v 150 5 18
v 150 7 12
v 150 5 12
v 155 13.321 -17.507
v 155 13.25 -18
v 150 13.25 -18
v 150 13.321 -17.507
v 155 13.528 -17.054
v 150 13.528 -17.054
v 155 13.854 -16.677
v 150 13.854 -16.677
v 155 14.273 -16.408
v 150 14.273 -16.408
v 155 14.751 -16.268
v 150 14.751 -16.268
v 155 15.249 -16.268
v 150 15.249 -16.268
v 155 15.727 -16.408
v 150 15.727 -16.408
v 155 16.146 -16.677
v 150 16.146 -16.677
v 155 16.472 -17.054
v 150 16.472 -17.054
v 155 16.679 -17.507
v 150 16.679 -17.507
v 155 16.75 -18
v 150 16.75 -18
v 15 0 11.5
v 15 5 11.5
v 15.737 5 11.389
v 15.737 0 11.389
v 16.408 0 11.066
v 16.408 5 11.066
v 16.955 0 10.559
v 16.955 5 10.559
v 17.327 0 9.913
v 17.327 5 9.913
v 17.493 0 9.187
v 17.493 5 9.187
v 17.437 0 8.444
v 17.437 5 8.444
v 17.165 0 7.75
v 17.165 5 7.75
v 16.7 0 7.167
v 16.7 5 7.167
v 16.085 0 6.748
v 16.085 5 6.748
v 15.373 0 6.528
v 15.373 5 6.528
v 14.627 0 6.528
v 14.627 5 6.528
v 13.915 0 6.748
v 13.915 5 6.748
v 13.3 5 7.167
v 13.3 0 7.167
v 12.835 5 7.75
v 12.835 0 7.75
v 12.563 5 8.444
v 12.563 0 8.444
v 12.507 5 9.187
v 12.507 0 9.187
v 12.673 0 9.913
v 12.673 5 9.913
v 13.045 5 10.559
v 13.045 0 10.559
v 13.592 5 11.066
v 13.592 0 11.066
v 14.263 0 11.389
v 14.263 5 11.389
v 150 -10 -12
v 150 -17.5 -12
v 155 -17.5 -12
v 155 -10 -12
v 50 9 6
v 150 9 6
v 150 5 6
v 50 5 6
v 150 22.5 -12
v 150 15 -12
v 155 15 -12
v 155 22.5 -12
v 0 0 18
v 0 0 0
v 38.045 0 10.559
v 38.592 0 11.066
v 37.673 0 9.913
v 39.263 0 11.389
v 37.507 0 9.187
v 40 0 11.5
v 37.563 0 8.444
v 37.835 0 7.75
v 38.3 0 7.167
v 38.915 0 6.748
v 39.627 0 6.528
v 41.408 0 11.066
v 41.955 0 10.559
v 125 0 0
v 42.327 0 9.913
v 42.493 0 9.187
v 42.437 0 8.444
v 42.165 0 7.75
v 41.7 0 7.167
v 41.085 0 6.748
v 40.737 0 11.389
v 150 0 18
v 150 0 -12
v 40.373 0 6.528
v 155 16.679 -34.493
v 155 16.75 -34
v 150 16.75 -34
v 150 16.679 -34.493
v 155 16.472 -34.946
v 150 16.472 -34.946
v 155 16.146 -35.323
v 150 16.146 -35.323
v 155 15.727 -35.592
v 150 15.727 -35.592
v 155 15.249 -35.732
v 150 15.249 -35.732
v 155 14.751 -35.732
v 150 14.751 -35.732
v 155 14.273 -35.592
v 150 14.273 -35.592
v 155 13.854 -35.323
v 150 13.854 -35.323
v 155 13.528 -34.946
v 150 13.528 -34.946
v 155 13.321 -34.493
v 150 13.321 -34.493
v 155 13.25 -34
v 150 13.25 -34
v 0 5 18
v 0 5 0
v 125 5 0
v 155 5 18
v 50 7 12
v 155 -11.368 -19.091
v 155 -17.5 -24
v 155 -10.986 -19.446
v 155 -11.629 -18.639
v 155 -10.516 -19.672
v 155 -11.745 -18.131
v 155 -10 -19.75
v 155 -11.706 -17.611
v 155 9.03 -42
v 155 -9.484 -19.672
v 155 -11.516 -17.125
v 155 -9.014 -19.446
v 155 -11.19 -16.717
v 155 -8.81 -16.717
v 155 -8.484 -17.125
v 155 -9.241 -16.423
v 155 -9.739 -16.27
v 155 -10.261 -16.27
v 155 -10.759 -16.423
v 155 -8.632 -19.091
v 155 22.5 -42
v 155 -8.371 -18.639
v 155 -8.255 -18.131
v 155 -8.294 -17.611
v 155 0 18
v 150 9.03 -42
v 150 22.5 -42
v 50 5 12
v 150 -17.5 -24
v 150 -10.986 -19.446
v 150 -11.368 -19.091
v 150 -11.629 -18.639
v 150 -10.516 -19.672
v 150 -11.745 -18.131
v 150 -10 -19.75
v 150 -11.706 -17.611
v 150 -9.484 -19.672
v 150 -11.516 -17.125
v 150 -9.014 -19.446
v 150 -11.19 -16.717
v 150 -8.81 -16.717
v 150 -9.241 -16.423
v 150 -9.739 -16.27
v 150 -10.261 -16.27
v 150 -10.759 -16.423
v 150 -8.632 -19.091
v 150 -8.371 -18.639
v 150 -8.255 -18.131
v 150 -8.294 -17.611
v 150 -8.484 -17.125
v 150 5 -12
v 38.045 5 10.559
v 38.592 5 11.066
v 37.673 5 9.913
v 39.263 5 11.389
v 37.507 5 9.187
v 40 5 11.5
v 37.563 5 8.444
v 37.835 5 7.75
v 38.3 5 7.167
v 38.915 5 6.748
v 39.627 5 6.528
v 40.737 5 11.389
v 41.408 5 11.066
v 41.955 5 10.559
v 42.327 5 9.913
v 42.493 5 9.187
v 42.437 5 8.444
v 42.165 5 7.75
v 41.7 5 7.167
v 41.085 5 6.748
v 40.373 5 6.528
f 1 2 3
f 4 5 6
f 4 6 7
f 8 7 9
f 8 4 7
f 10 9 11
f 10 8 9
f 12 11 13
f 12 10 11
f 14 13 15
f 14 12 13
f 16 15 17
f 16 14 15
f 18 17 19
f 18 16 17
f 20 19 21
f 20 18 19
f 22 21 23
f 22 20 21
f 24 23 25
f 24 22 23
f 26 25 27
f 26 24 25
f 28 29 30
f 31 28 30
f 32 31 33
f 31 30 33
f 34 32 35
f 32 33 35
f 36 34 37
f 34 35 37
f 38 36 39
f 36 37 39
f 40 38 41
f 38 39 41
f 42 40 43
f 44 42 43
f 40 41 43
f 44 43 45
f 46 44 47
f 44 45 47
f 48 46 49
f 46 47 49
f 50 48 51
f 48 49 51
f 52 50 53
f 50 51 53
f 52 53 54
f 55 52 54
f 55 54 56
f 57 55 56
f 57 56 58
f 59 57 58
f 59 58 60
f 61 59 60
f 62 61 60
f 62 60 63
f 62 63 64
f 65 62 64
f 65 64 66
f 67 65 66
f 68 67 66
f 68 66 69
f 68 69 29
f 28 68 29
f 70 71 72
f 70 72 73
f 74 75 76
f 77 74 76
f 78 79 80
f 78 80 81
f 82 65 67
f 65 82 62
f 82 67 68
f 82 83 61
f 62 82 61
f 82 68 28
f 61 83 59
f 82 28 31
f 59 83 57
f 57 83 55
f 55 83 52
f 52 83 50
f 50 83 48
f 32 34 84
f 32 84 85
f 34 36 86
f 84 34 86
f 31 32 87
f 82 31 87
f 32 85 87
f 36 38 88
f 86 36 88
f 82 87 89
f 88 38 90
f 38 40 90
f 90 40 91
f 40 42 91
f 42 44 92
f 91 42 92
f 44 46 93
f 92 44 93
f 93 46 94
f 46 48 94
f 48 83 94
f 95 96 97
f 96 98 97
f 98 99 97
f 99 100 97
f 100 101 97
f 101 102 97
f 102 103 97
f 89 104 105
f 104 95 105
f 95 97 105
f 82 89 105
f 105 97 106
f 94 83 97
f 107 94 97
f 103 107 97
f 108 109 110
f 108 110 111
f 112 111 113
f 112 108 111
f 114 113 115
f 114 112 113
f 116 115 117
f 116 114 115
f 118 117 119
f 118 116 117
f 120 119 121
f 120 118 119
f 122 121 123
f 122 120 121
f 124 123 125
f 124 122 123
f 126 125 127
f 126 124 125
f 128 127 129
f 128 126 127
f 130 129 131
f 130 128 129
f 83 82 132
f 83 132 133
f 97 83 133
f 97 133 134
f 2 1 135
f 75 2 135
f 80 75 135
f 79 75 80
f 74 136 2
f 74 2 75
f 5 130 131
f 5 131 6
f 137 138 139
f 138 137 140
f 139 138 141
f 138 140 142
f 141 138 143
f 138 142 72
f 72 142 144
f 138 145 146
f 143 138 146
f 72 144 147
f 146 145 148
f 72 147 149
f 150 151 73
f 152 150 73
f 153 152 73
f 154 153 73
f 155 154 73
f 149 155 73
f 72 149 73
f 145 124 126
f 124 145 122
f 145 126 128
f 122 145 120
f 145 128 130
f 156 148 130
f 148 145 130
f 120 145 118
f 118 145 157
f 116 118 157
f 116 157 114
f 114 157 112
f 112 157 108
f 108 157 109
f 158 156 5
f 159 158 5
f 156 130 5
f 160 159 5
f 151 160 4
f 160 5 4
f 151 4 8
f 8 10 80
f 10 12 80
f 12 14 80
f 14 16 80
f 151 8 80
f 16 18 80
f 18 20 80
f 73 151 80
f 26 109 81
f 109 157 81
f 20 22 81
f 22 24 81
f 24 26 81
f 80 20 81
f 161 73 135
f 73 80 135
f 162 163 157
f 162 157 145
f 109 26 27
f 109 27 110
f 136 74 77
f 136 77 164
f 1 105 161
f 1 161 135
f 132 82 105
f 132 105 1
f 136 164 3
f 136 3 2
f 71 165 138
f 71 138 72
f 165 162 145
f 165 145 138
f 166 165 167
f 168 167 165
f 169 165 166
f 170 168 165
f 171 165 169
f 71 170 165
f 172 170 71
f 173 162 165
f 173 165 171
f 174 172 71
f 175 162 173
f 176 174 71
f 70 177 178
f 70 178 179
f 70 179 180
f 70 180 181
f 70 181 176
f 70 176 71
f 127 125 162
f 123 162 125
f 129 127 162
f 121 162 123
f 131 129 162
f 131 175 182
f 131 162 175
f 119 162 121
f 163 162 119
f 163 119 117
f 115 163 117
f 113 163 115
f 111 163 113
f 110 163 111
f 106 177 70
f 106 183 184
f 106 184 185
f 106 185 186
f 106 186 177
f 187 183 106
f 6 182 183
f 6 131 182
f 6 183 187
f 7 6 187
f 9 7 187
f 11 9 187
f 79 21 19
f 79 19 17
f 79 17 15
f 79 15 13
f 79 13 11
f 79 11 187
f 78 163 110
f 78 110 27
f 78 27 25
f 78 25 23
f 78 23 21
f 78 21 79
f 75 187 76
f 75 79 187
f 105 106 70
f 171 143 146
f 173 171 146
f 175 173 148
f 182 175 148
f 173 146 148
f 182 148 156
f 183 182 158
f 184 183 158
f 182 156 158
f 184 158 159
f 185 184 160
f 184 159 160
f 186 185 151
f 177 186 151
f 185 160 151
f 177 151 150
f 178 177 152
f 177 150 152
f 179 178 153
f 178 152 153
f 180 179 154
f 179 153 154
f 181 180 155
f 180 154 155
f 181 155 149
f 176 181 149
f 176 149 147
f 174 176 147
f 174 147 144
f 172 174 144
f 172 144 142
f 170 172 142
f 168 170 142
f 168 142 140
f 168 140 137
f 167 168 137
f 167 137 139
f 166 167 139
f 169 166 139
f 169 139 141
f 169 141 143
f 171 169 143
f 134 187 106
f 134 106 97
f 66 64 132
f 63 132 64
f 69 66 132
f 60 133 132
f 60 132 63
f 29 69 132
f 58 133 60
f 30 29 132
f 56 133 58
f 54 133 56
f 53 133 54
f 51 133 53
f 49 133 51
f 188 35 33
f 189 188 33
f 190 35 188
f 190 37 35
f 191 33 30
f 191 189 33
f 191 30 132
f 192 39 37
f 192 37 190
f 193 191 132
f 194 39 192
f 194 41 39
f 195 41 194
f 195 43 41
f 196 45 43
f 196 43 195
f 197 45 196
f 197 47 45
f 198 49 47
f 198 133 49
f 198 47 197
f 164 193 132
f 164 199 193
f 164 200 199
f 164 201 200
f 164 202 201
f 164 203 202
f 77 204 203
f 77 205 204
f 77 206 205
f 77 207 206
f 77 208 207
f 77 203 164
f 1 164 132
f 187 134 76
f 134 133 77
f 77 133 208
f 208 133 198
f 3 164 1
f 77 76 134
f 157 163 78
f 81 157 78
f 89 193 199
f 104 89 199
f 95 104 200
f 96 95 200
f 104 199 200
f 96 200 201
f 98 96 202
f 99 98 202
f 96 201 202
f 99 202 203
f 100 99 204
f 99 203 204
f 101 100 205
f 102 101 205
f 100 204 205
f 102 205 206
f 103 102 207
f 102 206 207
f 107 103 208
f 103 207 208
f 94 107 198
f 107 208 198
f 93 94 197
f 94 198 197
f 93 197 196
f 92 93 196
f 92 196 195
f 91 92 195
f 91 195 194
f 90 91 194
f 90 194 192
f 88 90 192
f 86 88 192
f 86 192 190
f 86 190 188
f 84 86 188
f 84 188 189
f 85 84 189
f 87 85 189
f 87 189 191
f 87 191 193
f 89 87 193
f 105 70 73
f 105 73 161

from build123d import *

# Parameters (mm, degrees)
SKETCH_1_W          = 150
SKETCH_1_H          = 18
EXTRUDE_1_DEPTH     = 5
SKETCH_2_R          = 2.5
CUT_EXTRUDE_1_DEPTH = 152.158856836
EXTRUDE_3_DEPTH     = 5
CUT_EXTRUDE_2_REACH = 164.158
SKETCH_8_R          = 1.75
EXTRUDE_4_DEPTH     = 100
EXTRUDE_5_DEPTH     = 5


with BuildPart() as part:
    # 草图1 → 凸台-拉伸1 (new body)
    with BuildSketch(Plane(origin=(0, 0, 0), x_dir=(1, 0, 0), z_dir=(0, 1, 0))):
        with Locations((75, -9)):
            Rectangle(SKETCH_1_W, SKETCH_1_H)
    extrude(amount=EXTRUDE_1_DEPTH)

    # 草图2 → 切除-拉伸1 (cut, through all)
    with BuildSketch(Plane(origin=(0, 5, 0), x_dir=(1, 0, 0), z_dir=(0, 1, 0))):
        with Locations(Location((15, -9, 0), (0, 0, 270))):
            Circle(SKETCH_2_R)
        with Locations(Location((40, -9, 0), (0, 0, 270))):
            Circle(SKETCH_2_R)
    extrude(amount=-CUT_EXTRUDE_1_DEPTH, mode=Mode.SUBTRACT)

    # 草图6 → 凸台-拉伸3 (add)
    with BuildSketch(Plane(origin=(150, 0, 0), x_dir=(0, 0, -1), z_dir=(1, 0, 0))):
        Polygon((12, 15), (12, 22.5), (24, 22.5), (42, 22.5), (42, 9.029805857), (24, -17.5), (12, -17.5), (12, -10), (-18, 0), (-18, 5), align=None)
    extrude(amount=EXTRUDE_3_DEPTH)

    # 草图8 → 切除-拉伸2 (cut, up to next)
    with BuildSketch(Plane(origin=(155, 0, 0), x_dir=(0, 0, -1), z_dir=(1, 0, 0)), mode=Mode.PRIVATE) as cut_extrude_2_sk1:
        with Locations((18, -10)):
            Circle(SKETCH_8_R)
    cut_extrude_2_tool1 = extrude(cut_extrude_2_sk1.sketch, amount=-CUT_EXTRUDE_2_REACH, mode=Mode.PRIVATE) & part.part
    # 草图8 → 切除-拉伸2 (cut, up to next)
    with BuildSketch(Plane(origin=(155, 0, 0), x_dir=(0, 0, -1), z_dir=(1, 0, 0)), mode=Mode.PRIVATE) as cut_extrude_2_sk2:
        with BuildLine():
            Line((18, 16.75), (34, 16.75))
            ThreePointArc((34, 16.75), (35.75, 15), (34, 13.25))
            Line((34, 13.25), (18, 13.25))
            ThreePointArc((18, 13.25), (16.25, 15), (18, 16.75))
        make_face()
    cut_extrude_2_tool2 = extrude(cut_extrude_2_sk2.sketch, amount=-CUT_EXTRUDE_2_REACH, mode=Mode.PRIVATE) & part.part
    add(cut_extrude_2_tool1.solids().sort_by_distance((155, -10, -18))[0], mode=Mode.SUBTRACT)
    add(cut_extrude_2_tool2.solids().sort_by_distance((155, 15, -26))[0], mode=Mode.SUBTRACT)

    # 草图10 → 凸台-拉伸4 (add)
    with BuildSketch(Plane.ZY.offset(-150)):
        Polygon((6, 9), (6, 5), (9, 5), (12, 5), (12, 7), align=None)
    extrude(amount=EXTRUDE_4_DEPTH)

    # 草图11 → 凸台-拉伸5 (add)
    with BuildSketch(Plane(origin=(0, 5, 0), x_dir=(1, 0, 0), z_dir=(0, 1, 0))):
        Polygon((150, 0), (150, 12), (125, 0), align=None)
    extrude(amount=-EXTRUDE_5_DEPTH)


solid = part.part
